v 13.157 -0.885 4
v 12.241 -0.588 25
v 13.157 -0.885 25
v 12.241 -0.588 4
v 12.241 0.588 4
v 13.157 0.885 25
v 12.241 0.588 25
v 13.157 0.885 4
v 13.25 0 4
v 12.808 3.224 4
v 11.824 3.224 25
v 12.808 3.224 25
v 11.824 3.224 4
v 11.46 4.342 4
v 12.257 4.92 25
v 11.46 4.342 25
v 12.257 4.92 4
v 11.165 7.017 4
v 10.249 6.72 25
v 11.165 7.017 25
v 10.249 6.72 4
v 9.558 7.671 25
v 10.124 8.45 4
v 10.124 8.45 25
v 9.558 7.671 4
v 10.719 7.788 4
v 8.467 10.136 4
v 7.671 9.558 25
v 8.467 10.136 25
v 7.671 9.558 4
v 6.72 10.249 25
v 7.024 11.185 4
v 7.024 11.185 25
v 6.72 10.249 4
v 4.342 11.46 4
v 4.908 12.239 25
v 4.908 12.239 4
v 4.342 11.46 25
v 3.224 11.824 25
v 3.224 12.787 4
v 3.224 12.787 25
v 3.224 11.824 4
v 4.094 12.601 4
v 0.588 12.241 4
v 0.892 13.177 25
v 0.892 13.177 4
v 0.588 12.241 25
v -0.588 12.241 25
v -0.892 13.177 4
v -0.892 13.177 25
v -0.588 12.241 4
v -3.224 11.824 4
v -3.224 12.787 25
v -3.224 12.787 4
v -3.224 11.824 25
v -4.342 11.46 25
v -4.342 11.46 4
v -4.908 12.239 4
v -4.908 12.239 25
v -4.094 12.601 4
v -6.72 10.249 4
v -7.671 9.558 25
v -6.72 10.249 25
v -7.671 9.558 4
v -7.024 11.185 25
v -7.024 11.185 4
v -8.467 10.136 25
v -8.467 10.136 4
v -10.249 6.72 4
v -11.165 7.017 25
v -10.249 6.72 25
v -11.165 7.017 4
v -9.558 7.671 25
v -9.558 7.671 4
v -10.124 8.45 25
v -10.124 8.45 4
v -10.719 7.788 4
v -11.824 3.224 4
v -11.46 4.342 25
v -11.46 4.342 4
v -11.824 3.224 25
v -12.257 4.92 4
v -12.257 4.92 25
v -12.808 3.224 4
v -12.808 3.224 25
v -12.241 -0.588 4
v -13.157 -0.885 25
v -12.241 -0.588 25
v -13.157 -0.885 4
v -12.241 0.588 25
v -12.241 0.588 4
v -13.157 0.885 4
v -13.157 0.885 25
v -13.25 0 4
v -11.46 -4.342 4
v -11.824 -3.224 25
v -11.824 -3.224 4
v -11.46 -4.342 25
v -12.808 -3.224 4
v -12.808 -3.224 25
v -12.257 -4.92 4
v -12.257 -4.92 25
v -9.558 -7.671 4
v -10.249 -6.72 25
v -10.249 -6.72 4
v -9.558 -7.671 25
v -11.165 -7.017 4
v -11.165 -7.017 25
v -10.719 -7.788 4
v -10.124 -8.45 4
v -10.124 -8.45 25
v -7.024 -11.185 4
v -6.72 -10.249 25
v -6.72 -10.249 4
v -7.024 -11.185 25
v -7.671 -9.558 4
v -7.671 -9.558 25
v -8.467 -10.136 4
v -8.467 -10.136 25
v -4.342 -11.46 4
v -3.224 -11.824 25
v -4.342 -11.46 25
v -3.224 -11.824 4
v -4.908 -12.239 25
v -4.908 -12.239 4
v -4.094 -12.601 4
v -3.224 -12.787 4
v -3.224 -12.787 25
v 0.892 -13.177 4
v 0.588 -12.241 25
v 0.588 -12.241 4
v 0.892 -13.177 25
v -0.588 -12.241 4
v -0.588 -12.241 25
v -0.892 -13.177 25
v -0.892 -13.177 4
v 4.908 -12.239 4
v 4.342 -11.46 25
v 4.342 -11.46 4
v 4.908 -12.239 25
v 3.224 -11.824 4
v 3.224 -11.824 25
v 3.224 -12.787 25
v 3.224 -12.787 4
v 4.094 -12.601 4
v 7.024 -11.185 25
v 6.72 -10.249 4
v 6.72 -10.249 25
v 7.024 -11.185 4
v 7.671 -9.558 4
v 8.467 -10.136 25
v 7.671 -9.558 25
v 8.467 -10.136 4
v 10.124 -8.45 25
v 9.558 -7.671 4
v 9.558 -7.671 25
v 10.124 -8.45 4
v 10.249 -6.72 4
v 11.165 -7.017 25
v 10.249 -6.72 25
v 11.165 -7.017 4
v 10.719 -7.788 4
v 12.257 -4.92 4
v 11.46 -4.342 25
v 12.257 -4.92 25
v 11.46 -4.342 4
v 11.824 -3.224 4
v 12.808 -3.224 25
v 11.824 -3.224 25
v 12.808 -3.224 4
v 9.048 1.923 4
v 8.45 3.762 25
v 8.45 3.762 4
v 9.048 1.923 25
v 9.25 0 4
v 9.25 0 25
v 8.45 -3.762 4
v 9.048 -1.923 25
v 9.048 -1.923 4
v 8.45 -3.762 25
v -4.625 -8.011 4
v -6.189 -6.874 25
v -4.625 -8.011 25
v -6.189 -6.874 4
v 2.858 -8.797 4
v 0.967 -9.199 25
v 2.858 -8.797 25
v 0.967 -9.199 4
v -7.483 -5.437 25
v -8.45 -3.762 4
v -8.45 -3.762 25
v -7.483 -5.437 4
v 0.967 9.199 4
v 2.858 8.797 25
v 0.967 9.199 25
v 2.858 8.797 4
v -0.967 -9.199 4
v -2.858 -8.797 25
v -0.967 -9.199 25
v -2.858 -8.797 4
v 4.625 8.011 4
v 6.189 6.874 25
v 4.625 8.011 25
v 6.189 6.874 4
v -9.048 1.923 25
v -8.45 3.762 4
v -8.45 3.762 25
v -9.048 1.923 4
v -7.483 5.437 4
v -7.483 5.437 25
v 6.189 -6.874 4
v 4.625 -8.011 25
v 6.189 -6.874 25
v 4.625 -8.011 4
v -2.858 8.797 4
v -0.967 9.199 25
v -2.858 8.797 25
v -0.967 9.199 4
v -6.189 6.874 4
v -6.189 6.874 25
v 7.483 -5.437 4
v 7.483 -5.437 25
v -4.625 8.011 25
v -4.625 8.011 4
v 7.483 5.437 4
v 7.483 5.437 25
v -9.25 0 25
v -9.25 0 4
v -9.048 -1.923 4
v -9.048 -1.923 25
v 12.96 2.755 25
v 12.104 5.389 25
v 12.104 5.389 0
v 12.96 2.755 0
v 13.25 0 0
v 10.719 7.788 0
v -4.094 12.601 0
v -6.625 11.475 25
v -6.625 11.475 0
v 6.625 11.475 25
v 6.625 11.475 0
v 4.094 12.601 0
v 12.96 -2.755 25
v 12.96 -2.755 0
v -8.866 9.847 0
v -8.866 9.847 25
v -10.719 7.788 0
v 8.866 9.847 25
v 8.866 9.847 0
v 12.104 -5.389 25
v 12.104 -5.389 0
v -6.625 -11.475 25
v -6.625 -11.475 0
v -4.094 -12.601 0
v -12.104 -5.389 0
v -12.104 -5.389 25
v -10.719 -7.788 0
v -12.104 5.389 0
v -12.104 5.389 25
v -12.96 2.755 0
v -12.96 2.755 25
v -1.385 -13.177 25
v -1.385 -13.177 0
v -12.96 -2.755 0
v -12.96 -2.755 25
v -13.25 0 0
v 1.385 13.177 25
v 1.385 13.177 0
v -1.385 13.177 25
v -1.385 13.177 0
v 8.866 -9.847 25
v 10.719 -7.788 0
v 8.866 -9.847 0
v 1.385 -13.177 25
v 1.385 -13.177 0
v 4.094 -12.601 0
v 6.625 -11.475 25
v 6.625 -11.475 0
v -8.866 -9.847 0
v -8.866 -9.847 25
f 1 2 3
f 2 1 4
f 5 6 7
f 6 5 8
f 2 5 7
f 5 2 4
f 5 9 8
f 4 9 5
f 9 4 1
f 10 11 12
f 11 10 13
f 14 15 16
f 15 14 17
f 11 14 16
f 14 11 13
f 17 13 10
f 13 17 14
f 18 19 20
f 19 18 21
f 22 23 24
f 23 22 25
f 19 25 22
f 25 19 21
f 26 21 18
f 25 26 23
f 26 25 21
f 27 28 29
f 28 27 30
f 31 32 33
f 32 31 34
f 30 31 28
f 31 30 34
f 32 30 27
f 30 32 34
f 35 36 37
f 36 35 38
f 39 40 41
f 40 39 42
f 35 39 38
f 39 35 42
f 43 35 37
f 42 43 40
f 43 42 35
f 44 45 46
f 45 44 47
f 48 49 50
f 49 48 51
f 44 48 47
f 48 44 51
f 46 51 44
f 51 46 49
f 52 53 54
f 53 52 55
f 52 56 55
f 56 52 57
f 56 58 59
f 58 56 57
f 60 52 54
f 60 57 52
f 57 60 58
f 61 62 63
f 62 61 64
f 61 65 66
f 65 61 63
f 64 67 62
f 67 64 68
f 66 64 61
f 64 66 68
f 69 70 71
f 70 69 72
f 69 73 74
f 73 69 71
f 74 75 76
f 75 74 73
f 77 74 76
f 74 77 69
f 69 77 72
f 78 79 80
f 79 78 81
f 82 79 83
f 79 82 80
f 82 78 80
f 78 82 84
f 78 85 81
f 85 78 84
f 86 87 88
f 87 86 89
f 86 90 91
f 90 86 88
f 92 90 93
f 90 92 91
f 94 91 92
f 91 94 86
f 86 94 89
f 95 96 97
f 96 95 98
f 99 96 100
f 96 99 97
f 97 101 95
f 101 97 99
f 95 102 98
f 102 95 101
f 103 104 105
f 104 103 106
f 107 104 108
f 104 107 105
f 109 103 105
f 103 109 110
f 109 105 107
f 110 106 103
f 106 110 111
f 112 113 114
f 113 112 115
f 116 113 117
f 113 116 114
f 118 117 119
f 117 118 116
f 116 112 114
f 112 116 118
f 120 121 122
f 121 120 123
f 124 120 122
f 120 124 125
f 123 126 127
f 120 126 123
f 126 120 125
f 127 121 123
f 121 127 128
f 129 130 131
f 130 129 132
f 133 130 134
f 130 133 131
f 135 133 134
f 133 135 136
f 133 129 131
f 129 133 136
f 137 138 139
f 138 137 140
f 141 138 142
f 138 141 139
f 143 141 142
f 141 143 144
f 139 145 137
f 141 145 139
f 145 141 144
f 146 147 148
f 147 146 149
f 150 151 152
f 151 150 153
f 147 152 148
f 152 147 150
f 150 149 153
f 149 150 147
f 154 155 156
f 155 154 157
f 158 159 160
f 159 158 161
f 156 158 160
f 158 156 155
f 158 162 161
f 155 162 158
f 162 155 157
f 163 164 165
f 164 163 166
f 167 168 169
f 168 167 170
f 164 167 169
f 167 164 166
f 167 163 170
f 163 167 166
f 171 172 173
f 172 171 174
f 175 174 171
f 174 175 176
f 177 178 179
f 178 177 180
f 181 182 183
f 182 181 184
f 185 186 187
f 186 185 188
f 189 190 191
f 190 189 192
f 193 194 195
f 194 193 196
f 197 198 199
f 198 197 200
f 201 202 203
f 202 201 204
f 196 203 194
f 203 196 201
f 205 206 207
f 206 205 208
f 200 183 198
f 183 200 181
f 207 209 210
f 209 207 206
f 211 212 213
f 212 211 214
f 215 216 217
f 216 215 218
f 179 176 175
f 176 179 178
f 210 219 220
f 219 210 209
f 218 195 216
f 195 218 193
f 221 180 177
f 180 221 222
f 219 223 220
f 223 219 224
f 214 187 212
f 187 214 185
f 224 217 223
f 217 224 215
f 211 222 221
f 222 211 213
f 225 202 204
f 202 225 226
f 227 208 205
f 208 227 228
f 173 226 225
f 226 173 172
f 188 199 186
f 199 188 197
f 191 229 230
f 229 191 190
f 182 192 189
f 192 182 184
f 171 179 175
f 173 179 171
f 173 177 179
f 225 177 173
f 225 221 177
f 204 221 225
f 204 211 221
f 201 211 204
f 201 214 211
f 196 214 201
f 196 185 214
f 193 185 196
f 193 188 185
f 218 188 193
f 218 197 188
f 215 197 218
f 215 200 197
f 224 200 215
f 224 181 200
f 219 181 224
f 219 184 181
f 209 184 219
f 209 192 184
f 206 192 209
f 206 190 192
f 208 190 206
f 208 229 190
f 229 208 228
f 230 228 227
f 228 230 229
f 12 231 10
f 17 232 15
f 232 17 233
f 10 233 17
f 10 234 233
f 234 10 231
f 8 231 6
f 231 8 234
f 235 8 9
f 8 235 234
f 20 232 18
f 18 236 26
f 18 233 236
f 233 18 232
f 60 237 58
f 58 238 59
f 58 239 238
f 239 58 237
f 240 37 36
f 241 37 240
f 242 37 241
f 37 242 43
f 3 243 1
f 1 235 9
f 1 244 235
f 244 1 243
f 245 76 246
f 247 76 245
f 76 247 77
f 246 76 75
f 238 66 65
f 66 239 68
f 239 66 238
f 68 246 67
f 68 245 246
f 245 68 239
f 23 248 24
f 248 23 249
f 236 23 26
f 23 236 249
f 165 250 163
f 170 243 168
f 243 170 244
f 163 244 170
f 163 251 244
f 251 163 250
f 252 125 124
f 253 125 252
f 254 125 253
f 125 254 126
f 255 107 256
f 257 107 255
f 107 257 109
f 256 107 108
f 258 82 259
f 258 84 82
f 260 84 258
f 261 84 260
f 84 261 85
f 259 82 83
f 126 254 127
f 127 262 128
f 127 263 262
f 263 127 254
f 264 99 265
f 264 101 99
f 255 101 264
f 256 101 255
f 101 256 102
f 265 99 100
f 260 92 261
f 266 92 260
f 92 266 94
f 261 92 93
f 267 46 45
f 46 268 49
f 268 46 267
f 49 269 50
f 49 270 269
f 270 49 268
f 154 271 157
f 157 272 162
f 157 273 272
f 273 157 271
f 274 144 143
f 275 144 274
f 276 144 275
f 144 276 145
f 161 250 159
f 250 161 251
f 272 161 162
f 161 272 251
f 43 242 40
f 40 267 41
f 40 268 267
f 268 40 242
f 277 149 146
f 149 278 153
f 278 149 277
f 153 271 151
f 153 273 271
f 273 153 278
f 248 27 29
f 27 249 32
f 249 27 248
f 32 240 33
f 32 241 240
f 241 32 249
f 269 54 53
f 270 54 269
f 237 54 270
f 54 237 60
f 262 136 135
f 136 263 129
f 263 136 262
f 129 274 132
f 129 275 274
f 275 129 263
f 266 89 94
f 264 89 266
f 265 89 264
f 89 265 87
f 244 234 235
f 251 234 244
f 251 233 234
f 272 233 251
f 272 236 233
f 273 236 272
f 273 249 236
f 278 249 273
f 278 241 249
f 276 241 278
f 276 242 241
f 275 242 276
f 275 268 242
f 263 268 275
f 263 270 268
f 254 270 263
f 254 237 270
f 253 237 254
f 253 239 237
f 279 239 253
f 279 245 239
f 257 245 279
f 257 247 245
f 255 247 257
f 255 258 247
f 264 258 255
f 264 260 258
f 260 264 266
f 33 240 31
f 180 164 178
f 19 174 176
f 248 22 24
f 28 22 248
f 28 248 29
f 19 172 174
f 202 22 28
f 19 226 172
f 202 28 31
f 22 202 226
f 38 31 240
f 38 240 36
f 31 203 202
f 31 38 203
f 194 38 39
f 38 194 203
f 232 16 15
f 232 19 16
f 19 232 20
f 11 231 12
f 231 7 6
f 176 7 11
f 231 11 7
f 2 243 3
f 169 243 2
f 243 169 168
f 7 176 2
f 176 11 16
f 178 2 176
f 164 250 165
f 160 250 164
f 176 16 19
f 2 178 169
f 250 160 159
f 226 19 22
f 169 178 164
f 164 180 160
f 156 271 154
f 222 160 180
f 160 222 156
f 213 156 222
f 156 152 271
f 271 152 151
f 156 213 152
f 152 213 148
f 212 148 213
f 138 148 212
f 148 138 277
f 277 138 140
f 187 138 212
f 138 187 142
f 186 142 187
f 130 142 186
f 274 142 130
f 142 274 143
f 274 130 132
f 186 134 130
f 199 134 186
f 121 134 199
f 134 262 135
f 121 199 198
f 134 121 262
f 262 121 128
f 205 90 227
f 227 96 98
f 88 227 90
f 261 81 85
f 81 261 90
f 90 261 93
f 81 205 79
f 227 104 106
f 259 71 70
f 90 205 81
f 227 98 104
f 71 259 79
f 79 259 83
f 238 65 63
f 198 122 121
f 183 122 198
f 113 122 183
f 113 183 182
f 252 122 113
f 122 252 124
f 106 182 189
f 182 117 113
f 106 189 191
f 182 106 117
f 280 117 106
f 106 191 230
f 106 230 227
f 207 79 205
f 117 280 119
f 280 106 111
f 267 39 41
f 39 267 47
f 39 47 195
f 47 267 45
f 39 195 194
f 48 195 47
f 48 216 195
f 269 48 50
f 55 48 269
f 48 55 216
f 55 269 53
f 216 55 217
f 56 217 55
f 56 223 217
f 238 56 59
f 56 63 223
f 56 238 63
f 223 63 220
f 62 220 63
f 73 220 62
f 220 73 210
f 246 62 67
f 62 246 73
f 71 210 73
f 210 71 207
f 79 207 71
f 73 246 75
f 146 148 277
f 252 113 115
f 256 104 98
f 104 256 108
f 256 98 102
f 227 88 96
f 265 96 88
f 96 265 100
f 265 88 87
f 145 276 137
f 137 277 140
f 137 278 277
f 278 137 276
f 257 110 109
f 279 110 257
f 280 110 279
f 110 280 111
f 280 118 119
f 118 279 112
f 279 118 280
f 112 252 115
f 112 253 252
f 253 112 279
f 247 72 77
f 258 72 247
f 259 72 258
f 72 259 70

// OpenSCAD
module post(d,h) {
  postr=d/2;
  difference(){
    cylinder(r=postr, h=h);
    translate([0,0,+4]){
      cylinder(r=postr-4,h=h+3);
      for(i = [0:19]) {
        rotate([0,0,i*360/20]) translate([postr-.2,0,0]) cylinder(r=1,h=h);
      }
    }
  }
}

post(26.5,25);
